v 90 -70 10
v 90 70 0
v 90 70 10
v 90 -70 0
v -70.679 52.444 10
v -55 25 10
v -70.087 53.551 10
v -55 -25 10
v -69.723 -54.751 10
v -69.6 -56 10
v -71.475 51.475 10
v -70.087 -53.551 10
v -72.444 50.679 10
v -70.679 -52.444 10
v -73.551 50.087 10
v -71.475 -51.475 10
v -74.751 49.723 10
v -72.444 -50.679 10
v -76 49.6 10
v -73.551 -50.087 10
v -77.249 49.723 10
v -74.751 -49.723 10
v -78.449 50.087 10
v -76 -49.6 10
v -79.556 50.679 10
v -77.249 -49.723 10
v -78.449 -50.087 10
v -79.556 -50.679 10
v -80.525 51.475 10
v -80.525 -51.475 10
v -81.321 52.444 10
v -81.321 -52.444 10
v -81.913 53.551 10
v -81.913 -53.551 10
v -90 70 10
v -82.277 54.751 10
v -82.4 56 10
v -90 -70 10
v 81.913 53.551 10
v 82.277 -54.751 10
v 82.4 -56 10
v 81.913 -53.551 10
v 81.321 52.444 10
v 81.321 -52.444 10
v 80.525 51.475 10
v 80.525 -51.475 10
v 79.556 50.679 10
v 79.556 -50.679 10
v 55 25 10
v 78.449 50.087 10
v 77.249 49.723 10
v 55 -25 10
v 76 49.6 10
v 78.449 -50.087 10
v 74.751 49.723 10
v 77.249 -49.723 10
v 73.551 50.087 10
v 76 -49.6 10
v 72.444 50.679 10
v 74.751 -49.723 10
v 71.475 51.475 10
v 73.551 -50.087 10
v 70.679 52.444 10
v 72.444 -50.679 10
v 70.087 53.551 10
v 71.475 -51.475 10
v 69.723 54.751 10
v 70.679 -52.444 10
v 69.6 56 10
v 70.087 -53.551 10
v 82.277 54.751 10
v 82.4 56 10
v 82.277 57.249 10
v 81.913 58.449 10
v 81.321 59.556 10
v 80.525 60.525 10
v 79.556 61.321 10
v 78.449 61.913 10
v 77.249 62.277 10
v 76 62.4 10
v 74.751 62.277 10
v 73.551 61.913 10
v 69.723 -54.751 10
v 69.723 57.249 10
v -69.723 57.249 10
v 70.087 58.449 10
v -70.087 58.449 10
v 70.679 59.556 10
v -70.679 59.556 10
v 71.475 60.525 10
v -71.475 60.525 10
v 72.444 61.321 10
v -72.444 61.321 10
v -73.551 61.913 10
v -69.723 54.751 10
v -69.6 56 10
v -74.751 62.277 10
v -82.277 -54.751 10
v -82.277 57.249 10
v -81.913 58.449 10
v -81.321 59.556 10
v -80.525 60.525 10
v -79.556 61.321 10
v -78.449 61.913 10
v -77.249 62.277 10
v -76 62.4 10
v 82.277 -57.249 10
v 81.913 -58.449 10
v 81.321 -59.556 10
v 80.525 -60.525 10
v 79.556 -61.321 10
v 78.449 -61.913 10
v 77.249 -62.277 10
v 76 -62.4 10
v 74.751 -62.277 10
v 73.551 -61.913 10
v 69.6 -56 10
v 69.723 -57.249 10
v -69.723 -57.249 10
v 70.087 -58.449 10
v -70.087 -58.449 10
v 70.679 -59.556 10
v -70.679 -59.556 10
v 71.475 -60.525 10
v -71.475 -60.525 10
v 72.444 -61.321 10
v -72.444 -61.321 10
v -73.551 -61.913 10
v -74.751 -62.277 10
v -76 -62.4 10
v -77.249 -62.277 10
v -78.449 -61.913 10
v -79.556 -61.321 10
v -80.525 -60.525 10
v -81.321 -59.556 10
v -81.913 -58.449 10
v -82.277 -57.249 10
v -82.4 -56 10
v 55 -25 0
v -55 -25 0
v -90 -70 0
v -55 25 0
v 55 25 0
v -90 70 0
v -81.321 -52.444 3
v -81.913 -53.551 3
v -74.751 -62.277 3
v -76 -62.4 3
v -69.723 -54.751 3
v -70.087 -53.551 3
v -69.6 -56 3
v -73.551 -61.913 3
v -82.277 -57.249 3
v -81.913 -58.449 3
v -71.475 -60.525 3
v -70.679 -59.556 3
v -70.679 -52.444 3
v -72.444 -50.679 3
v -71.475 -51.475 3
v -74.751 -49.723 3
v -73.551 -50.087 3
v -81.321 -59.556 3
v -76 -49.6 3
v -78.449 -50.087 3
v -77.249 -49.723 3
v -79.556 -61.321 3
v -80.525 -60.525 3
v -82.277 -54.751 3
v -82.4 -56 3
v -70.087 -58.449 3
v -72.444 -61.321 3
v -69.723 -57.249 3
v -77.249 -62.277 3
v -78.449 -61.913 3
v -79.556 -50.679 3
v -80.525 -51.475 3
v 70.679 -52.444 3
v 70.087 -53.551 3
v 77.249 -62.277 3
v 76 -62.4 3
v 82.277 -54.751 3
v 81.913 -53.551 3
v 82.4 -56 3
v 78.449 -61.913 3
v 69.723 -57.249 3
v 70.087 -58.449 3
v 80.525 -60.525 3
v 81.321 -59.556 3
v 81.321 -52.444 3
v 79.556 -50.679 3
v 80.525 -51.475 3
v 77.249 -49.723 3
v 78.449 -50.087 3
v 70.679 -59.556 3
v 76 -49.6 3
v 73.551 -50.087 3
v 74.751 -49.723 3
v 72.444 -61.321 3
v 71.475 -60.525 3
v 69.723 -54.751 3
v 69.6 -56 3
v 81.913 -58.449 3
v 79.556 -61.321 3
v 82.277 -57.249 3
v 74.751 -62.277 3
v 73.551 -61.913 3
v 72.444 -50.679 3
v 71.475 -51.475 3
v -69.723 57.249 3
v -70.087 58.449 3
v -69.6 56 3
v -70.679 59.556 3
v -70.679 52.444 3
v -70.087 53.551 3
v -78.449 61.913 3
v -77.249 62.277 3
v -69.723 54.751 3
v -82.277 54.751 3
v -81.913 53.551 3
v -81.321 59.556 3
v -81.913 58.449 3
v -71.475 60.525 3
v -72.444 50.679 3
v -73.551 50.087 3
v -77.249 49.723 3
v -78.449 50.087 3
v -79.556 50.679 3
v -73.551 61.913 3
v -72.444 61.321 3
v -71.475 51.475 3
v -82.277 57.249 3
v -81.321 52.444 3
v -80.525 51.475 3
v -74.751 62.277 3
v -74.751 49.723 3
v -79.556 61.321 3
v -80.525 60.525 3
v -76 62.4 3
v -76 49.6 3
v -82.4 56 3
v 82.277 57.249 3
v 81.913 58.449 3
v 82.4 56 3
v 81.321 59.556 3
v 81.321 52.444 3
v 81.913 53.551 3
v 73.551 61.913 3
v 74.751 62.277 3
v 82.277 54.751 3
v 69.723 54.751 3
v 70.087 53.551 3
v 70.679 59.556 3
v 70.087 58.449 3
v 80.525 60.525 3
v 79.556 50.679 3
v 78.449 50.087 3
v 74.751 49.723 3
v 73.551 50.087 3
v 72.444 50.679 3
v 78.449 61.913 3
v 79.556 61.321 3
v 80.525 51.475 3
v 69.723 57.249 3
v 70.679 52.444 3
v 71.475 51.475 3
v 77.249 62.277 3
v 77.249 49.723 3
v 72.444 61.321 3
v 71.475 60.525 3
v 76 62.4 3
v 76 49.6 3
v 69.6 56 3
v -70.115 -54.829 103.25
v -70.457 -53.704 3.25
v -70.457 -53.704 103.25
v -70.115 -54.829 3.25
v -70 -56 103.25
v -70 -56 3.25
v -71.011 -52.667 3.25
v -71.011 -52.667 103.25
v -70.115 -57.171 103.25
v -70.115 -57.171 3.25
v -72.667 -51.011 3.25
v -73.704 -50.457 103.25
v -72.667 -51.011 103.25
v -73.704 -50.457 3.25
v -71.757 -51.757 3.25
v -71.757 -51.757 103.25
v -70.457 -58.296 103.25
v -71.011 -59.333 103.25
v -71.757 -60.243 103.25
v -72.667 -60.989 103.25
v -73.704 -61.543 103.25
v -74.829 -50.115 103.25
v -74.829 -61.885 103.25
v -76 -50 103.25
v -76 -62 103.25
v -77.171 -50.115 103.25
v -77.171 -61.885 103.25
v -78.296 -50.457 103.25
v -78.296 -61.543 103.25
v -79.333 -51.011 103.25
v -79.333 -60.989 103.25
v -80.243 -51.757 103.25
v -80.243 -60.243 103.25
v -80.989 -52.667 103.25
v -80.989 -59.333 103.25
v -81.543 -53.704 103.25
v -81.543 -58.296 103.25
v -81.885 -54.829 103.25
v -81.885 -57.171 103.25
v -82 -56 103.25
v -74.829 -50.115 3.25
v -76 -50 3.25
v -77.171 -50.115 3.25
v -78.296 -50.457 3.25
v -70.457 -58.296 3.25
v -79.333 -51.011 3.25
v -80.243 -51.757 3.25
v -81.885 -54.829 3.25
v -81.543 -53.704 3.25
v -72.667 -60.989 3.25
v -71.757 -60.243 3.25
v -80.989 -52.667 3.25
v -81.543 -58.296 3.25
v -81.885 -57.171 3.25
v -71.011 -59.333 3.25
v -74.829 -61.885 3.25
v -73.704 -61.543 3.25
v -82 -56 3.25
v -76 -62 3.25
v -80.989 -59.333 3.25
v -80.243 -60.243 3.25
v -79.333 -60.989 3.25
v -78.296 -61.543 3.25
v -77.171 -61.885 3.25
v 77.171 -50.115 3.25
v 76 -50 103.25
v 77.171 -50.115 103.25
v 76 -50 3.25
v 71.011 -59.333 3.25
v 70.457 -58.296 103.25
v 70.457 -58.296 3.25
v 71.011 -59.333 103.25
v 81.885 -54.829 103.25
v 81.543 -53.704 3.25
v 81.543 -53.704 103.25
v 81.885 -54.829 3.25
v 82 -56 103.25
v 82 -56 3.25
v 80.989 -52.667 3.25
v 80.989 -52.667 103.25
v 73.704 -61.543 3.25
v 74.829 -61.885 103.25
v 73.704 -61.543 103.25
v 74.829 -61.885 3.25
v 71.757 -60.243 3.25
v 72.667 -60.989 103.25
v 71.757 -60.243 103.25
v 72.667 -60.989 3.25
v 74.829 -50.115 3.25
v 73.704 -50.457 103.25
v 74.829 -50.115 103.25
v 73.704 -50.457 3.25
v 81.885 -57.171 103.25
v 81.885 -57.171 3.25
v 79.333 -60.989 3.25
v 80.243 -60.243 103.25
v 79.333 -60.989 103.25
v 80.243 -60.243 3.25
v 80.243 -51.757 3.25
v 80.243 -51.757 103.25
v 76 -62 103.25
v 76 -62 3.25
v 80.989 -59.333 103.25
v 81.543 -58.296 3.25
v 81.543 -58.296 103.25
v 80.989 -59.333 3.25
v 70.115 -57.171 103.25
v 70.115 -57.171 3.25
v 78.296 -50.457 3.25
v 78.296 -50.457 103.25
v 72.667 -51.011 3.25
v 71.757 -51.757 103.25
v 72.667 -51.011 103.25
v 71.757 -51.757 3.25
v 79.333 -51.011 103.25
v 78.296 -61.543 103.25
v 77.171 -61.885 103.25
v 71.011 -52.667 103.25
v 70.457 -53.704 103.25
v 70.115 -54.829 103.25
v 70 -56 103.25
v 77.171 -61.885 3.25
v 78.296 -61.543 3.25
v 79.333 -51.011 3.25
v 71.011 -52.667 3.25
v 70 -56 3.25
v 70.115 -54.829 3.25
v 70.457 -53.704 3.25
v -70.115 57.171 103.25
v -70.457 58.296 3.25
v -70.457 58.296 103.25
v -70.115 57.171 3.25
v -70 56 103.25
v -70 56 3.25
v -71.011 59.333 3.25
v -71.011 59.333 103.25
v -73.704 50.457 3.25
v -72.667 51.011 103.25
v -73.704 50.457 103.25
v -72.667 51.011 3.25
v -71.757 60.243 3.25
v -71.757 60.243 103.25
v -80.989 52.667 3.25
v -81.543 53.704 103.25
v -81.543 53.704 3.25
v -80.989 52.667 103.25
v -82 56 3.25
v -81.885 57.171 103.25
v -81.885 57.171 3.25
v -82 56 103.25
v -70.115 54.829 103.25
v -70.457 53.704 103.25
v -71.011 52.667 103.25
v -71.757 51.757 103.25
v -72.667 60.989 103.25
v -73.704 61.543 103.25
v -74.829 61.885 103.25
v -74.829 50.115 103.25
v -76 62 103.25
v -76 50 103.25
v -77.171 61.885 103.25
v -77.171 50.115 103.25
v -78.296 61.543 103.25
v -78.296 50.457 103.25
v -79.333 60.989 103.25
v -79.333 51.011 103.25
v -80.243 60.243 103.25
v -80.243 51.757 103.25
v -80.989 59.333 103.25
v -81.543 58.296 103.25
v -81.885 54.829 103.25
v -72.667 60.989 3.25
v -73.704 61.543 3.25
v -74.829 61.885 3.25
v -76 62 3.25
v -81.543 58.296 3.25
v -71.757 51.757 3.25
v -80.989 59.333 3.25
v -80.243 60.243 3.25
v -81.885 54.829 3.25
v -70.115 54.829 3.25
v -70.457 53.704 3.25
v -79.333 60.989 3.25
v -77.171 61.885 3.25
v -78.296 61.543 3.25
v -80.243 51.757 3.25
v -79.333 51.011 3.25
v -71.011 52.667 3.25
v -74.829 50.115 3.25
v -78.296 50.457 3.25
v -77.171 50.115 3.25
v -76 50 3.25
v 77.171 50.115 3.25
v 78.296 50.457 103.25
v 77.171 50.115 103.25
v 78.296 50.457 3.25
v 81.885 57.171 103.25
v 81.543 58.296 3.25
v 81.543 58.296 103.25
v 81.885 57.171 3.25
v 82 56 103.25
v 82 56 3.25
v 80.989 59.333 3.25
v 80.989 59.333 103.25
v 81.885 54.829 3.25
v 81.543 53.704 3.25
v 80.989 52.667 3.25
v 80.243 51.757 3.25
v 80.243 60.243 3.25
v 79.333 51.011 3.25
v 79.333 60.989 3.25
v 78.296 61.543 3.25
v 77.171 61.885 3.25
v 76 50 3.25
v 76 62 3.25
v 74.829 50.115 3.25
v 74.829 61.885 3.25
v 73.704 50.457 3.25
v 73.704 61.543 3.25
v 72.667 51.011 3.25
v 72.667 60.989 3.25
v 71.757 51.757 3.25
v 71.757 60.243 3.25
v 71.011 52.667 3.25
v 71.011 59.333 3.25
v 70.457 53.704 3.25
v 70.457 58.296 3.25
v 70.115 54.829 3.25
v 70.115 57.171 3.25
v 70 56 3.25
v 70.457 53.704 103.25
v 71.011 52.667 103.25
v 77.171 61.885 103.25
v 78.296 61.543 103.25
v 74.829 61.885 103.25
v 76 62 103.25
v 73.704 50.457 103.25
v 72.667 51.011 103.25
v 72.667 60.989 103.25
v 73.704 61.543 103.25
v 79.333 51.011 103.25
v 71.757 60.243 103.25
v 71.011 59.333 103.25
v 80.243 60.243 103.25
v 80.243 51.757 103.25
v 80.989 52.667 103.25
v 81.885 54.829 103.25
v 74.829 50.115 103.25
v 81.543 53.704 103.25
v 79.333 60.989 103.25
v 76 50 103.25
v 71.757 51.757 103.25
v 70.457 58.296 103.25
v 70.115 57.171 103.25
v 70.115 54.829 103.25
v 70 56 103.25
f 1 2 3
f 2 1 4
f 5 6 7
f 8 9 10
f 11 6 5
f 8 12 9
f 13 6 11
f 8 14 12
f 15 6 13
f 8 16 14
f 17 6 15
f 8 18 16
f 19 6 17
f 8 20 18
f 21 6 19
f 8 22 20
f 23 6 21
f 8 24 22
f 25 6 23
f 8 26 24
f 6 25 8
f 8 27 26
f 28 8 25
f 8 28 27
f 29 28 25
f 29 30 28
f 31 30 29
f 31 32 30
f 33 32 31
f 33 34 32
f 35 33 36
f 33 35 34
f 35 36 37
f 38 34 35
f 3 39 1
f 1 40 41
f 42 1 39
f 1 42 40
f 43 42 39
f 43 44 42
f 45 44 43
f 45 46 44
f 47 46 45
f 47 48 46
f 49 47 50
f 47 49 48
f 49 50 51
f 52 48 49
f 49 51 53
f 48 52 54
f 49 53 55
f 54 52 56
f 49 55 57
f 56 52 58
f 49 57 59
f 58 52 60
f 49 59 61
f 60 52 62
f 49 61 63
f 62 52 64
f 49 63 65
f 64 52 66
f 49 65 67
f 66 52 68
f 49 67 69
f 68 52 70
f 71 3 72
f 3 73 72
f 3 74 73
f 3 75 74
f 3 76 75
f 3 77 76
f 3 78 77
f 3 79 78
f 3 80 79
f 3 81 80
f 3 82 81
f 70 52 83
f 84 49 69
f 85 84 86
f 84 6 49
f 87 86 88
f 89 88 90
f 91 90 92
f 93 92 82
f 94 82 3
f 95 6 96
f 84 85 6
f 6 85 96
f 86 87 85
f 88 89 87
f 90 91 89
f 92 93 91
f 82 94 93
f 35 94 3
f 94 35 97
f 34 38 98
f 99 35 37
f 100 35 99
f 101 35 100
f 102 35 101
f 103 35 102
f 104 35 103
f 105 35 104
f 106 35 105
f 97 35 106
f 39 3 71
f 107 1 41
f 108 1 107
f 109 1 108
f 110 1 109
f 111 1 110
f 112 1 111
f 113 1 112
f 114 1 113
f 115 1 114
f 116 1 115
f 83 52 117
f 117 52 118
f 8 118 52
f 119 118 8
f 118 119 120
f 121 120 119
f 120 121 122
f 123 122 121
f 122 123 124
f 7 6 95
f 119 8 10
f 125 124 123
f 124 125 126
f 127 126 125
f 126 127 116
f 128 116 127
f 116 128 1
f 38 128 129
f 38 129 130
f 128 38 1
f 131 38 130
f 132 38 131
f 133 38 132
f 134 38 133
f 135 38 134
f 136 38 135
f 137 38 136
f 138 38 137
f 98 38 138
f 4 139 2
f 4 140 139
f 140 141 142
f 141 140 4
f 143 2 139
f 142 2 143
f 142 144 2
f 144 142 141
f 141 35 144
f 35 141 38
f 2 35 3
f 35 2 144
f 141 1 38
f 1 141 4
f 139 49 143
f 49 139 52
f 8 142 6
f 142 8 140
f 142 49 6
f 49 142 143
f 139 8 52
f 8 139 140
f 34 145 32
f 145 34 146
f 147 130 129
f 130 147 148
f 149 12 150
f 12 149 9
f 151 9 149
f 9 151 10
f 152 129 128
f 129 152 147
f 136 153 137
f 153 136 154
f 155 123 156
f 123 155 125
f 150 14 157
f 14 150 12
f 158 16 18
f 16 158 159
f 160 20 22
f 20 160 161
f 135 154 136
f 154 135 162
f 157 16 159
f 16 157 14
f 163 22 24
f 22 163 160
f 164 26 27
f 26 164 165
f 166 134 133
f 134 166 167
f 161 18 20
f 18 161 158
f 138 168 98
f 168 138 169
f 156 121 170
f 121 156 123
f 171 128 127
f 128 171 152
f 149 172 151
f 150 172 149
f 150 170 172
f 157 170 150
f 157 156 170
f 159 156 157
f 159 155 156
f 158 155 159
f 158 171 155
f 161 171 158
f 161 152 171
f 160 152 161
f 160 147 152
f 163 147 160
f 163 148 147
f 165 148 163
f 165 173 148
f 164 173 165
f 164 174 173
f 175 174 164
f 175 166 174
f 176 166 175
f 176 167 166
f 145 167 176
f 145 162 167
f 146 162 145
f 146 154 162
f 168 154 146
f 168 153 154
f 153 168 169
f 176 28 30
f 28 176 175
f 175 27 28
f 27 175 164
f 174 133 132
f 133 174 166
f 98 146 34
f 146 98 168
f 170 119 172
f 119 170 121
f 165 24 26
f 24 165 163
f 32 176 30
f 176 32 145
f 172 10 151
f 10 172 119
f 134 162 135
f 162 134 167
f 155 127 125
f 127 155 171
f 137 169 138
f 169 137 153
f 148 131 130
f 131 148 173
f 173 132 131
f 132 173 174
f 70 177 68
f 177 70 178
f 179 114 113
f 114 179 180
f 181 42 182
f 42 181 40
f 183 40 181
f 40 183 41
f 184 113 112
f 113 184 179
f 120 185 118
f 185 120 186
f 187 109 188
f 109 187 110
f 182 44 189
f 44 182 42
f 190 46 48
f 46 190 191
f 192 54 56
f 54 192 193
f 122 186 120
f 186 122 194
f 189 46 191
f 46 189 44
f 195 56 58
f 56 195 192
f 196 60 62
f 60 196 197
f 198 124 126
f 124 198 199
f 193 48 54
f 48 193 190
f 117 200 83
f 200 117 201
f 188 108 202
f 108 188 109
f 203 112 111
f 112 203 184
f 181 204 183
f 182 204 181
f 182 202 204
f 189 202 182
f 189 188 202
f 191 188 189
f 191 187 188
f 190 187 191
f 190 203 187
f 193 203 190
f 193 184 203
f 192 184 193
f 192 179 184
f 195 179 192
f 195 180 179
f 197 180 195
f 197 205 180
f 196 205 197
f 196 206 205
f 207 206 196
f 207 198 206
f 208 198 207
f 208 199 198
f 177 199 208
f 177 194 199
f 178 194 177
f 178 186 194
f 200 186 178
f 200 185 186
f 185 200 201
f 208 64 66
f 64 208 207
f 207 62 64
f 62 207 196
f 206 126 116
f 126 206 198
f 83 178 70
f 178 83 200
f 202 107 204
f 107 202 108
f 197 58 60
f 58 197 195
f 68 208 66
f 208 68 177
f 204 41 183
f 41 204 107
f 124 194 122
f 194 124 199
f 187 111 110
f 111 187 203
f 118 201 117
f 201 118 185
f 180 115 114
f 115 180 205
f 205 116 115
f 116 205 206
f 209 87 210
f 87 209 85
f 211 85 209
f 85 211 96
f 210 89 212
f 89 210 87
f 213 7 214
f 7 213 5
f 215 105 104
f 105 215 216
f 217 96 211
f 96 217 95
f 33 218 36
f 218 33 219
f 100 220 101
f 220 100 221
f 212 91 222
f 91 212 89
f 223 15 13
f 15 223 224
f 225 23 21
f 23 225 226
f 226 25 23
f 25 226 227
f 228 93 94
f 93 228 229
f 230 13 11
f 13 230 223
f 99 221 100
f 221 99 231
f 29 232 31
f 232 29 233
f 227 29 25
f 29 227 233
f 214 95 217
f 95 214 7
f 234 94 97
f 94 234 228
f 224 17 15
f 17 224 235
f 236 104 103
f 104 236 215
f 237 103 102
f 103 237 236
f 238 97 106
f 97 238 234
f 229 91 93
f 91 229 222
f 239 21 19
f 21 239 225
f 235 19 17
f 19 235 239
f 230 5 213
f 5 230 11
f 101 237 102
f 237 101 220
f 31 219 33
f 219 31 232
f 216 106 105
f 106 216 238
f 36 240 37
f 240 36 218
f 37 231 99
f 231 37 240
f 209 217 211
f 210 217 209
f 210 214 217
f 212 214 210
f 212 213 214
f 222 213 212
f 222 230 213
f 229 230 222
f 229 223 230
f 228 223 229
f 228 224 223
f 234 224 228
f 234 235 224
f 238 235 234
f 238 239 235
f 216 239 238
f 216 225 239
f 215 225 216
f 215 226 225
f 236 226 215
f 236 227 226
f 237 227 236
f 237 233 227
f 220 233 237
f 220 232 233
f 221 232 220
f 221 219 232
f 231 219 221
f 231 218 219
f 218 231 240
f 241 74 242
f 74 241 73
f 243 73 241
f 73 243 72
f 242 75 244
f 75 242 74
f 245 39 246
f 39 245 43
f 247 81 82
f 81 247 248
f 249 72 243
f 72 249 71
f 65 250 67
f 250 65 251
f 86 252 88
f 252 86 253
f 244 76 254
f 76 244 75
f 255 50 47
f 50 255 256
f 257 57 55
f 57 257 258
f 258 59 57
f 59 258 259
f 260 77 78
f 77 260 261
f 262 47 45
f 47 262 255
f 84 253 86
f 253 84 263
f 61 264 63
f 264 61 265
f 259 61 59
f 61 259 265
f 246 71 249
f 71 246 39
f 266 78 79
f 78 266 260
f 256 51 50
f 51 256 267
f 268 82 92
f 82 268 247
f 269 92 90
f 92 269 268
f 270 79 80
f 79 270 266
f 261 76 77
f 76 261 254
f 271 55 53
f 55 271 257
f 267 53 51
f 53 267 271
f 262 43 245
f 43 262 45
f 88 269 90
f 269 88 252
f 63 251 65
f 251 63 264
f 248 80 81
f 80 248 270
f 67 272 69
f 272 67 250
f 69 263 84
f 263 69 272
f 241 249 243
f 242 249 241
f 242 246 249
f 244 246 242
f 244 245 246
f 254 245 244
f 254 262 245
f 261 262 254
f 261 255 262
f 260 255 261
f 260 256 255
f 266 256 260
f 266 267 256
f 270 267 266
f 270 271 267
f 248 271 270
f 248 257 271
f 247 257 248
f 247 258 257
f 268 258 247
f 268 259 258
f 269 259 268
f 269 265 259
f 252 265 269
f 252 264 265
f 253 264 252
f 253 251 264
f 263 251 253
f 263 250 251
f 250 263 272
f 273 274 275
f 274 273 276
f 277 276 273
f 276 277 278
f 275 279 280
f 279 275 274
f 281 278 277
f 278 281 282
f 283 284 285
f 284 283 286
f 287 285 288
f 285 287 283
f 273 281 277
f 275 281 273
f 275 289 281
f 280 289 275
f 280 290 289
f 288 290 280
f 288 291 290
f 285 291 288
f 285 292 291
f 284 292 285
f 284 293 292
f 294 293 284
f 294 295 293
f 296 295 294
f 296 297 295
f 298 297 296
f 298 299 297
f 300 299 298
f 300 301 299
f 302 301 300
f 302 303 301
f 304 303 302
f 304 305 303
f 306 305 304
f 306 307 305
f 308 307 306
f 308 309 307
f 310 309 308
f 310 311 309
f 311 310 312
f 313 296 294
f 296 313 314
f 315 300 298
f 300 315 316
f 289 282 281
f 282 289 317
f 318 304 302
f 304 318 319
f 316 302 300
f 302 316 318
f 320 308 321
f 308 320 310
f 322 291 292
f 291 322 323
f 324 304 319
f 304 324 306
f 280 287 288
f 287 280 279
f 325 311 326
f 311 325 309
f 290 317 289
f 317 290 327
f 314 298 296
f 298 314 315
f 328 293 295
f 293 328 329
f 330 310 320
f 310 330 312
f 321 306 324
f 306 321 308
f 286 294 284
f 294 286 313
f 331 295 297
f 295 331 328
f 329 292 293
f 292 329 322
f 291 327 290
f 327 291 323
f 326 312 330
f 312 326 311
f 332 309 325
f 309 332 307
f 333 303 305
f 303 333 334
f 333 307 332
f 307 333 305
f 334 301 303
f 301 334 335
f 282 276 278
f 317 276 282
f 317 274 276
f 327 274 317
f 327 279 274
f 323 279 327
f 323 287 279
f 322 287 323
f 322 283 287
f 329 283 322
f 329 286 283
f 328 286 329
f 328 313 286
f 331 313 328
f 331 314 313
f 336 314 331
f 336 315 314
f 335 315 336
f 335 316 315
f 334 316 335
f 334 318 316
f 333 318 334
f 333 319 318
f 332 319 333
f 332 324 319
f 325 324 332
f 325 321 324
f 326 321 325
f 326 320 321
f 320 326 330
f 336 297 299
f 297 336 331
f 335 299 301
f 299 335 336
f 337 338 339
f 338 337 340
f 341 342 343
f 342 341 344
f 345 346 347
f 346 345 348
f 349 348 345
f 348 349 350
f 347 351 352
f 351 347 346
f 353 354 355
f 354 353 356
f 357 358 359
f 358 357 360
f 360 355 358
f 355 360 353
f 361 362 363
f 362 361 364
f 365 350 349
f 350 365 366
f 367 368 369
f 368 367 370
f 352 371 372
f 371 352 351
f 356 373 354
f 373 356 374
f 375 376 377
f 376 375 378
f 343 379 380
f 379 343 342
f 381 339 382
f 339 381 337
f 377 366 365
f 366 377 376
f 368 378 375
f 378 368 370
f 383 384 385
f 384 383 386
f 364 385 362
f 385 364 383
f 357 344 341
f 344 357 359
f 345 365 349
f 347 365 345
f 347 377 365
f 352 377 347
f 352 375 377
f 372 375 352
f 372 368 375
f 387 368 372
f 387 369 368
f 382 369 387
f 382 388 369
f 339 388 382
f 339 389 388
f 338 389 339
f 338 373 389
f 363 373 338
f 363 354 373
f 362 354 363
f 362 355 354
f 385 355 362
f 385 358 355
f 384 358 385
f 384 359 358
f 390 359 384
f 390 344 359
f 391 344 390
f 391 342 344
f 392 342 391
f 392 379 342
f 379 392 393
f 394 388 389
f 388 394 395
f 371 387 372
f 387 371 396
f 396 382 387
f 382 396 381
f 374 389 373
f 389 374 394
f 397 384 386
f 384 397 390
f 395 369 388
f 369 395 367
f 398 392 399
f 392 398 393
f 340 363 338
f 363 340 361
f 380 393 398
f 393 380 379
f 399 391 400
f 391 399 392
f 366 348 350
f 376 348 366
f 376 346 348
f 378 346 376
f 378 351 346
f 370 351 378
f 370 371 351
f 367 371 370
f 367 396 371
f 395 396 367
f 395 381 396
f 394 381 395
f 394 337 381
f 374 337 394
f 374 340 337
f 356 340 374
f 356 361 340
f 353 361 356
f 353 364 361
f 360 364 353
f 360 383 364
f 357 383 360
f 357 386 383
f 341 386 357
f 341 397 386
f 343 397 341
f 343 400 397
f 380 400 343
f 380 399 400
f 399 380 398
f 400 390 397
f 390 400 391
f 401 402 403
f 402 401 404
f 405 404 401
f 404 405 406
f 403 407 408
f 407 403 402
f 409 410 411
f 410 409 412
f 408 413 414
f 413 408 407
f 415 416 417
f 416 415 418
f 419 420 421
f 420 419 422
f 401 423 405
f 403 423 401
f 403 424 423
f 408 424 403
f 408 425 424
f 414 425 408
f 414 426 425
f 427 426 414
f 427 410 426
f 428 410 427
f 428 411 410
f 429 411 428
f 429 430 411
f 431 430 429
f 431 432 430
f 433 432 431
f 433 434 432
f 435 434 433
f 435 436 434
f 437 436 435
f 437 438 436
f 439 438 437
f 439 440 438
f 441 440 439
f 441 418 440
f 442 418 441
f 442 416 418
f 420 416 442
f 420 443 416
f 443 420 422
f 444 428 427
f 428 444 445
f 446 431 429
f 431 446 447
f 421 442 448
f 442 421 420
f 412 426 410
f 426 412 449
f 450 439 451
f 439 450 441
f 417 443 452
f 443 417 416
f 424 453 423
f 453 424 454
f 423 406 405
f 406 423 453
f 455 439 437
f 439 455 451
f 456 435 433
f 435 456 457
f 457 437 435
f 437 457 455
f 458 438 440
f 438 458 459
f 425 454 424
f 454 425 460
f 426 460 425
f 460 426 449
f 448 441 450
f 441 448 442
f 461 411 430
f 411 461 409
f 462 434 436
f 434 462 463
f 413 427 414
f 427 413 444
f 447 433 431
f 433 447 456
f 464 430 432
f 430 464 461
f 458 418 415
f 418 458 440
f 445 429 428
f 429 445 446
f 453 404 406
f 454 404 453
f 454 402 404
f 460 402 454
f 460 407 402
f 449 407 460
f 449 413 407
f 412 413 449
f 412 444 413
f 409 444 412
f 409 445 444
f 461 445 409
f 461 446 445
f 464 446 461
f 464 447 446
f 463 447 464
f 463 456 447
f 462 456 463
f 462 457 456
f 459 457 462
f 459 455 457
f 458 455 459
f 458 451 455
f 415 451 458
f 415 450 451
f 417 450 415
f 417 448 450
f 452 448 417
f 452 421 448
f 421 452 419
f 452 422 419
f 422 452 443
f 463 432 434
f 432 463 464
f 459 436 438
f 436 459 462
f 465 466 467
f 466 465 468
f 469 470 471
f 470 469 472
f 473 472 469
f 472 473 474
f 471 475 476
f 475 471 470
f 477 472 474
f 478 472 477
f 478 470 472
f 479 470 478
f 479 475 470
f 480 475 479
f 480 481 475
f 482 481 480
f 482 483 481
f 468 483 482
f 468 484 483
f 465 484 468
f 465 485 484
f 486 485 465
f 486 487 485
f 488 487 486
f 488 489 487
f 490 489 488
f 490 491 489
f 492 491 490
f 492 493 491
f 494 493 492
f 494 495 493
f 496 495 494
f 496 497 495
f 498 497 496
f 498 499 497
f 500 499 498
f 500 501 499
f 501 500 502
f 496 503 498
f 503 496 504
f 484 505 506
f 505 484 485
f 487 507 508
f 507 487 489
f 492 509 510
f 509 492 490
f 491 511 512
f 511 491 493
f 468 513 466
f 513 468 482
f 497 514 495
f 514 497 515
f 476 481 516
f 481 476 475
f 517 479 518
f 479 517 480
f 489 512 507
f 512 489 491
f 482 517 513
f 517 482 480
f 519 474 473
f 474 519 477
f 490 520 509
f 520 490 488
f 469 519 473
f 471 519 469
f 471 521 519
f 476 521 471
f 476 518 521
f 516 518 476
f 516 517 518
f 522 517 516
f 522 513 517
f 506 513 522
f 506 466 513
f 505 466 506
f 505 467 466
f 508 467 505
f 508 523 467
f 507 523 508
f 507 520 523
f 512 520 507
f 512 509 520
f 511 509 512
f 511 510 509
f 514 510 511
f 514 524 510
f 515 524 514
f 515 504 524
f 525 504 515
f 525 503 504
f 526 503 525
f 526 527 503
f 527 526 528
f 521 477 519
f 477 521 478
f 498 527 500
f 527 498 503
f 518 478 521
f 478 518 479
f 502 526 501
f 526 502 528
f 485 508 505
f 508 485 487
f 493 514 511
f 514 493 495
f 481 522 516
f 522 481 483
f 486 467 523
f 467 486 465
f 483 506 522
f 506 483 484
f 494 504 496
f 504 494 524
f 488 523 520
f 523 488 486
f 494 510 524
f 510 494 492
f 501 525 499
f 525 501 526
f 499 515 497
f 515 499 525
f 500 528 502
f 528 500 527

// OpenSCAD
$fn = 32;

// ------------------------------------------------------------------------
// Frame with four posts: 180 x 140 mm frame, four d12 posts
// Every part is its own module, assembly() places them once.
// ------------------------------------------------------------------------

// --- part 1 ---
module base_frame() {
  difference() {
    translate([-90, -70, 0]) cube([180, 140, 10]);
    translate([-55, -25, -1]) cube([110, 50, 12]);
    translate([-76, -56, 3]) cylinder(h = 8, d = 12.8);
    translate([76, -56, 3]) cylinder(h = 8, d = 12.8);
    translate([-76, 56, 3]) cylinder(h = 8, d = 12.8);
    translate([76, 56, 3]) cylinder(h = 8, d = 12.8);
  }
}

// --- part 2 ---
module post1() {
  cylinder(h = 100, d = 12);
}

// --- part 3 ---
module post2() {
  cylinder(h = 100, d = 12);
}

// --- part 4 ---
module post3() {
  cylinder(h = 100, d = 12);
}

// --- part 5 ---
module post4() {
  cylinder(h = 100, d = 12);
}

// --- assembly ---
module assembly() {
  translate([0, 0, 0]) rotate([0, 0, 0]) base_frame();
  translate([-76, -56, 3.25]) rotate([0, 0, 0]) post1();
  translate([76, -56, 3.25]) rotate([0, 0, 0]) post2();
  translate([-76, 56, 3.25]) rotate([0, 0, 0]) post3();
  translate([76, 56, 3.25]) rotate([0, 0, 0]) post4();
}

assembly();
